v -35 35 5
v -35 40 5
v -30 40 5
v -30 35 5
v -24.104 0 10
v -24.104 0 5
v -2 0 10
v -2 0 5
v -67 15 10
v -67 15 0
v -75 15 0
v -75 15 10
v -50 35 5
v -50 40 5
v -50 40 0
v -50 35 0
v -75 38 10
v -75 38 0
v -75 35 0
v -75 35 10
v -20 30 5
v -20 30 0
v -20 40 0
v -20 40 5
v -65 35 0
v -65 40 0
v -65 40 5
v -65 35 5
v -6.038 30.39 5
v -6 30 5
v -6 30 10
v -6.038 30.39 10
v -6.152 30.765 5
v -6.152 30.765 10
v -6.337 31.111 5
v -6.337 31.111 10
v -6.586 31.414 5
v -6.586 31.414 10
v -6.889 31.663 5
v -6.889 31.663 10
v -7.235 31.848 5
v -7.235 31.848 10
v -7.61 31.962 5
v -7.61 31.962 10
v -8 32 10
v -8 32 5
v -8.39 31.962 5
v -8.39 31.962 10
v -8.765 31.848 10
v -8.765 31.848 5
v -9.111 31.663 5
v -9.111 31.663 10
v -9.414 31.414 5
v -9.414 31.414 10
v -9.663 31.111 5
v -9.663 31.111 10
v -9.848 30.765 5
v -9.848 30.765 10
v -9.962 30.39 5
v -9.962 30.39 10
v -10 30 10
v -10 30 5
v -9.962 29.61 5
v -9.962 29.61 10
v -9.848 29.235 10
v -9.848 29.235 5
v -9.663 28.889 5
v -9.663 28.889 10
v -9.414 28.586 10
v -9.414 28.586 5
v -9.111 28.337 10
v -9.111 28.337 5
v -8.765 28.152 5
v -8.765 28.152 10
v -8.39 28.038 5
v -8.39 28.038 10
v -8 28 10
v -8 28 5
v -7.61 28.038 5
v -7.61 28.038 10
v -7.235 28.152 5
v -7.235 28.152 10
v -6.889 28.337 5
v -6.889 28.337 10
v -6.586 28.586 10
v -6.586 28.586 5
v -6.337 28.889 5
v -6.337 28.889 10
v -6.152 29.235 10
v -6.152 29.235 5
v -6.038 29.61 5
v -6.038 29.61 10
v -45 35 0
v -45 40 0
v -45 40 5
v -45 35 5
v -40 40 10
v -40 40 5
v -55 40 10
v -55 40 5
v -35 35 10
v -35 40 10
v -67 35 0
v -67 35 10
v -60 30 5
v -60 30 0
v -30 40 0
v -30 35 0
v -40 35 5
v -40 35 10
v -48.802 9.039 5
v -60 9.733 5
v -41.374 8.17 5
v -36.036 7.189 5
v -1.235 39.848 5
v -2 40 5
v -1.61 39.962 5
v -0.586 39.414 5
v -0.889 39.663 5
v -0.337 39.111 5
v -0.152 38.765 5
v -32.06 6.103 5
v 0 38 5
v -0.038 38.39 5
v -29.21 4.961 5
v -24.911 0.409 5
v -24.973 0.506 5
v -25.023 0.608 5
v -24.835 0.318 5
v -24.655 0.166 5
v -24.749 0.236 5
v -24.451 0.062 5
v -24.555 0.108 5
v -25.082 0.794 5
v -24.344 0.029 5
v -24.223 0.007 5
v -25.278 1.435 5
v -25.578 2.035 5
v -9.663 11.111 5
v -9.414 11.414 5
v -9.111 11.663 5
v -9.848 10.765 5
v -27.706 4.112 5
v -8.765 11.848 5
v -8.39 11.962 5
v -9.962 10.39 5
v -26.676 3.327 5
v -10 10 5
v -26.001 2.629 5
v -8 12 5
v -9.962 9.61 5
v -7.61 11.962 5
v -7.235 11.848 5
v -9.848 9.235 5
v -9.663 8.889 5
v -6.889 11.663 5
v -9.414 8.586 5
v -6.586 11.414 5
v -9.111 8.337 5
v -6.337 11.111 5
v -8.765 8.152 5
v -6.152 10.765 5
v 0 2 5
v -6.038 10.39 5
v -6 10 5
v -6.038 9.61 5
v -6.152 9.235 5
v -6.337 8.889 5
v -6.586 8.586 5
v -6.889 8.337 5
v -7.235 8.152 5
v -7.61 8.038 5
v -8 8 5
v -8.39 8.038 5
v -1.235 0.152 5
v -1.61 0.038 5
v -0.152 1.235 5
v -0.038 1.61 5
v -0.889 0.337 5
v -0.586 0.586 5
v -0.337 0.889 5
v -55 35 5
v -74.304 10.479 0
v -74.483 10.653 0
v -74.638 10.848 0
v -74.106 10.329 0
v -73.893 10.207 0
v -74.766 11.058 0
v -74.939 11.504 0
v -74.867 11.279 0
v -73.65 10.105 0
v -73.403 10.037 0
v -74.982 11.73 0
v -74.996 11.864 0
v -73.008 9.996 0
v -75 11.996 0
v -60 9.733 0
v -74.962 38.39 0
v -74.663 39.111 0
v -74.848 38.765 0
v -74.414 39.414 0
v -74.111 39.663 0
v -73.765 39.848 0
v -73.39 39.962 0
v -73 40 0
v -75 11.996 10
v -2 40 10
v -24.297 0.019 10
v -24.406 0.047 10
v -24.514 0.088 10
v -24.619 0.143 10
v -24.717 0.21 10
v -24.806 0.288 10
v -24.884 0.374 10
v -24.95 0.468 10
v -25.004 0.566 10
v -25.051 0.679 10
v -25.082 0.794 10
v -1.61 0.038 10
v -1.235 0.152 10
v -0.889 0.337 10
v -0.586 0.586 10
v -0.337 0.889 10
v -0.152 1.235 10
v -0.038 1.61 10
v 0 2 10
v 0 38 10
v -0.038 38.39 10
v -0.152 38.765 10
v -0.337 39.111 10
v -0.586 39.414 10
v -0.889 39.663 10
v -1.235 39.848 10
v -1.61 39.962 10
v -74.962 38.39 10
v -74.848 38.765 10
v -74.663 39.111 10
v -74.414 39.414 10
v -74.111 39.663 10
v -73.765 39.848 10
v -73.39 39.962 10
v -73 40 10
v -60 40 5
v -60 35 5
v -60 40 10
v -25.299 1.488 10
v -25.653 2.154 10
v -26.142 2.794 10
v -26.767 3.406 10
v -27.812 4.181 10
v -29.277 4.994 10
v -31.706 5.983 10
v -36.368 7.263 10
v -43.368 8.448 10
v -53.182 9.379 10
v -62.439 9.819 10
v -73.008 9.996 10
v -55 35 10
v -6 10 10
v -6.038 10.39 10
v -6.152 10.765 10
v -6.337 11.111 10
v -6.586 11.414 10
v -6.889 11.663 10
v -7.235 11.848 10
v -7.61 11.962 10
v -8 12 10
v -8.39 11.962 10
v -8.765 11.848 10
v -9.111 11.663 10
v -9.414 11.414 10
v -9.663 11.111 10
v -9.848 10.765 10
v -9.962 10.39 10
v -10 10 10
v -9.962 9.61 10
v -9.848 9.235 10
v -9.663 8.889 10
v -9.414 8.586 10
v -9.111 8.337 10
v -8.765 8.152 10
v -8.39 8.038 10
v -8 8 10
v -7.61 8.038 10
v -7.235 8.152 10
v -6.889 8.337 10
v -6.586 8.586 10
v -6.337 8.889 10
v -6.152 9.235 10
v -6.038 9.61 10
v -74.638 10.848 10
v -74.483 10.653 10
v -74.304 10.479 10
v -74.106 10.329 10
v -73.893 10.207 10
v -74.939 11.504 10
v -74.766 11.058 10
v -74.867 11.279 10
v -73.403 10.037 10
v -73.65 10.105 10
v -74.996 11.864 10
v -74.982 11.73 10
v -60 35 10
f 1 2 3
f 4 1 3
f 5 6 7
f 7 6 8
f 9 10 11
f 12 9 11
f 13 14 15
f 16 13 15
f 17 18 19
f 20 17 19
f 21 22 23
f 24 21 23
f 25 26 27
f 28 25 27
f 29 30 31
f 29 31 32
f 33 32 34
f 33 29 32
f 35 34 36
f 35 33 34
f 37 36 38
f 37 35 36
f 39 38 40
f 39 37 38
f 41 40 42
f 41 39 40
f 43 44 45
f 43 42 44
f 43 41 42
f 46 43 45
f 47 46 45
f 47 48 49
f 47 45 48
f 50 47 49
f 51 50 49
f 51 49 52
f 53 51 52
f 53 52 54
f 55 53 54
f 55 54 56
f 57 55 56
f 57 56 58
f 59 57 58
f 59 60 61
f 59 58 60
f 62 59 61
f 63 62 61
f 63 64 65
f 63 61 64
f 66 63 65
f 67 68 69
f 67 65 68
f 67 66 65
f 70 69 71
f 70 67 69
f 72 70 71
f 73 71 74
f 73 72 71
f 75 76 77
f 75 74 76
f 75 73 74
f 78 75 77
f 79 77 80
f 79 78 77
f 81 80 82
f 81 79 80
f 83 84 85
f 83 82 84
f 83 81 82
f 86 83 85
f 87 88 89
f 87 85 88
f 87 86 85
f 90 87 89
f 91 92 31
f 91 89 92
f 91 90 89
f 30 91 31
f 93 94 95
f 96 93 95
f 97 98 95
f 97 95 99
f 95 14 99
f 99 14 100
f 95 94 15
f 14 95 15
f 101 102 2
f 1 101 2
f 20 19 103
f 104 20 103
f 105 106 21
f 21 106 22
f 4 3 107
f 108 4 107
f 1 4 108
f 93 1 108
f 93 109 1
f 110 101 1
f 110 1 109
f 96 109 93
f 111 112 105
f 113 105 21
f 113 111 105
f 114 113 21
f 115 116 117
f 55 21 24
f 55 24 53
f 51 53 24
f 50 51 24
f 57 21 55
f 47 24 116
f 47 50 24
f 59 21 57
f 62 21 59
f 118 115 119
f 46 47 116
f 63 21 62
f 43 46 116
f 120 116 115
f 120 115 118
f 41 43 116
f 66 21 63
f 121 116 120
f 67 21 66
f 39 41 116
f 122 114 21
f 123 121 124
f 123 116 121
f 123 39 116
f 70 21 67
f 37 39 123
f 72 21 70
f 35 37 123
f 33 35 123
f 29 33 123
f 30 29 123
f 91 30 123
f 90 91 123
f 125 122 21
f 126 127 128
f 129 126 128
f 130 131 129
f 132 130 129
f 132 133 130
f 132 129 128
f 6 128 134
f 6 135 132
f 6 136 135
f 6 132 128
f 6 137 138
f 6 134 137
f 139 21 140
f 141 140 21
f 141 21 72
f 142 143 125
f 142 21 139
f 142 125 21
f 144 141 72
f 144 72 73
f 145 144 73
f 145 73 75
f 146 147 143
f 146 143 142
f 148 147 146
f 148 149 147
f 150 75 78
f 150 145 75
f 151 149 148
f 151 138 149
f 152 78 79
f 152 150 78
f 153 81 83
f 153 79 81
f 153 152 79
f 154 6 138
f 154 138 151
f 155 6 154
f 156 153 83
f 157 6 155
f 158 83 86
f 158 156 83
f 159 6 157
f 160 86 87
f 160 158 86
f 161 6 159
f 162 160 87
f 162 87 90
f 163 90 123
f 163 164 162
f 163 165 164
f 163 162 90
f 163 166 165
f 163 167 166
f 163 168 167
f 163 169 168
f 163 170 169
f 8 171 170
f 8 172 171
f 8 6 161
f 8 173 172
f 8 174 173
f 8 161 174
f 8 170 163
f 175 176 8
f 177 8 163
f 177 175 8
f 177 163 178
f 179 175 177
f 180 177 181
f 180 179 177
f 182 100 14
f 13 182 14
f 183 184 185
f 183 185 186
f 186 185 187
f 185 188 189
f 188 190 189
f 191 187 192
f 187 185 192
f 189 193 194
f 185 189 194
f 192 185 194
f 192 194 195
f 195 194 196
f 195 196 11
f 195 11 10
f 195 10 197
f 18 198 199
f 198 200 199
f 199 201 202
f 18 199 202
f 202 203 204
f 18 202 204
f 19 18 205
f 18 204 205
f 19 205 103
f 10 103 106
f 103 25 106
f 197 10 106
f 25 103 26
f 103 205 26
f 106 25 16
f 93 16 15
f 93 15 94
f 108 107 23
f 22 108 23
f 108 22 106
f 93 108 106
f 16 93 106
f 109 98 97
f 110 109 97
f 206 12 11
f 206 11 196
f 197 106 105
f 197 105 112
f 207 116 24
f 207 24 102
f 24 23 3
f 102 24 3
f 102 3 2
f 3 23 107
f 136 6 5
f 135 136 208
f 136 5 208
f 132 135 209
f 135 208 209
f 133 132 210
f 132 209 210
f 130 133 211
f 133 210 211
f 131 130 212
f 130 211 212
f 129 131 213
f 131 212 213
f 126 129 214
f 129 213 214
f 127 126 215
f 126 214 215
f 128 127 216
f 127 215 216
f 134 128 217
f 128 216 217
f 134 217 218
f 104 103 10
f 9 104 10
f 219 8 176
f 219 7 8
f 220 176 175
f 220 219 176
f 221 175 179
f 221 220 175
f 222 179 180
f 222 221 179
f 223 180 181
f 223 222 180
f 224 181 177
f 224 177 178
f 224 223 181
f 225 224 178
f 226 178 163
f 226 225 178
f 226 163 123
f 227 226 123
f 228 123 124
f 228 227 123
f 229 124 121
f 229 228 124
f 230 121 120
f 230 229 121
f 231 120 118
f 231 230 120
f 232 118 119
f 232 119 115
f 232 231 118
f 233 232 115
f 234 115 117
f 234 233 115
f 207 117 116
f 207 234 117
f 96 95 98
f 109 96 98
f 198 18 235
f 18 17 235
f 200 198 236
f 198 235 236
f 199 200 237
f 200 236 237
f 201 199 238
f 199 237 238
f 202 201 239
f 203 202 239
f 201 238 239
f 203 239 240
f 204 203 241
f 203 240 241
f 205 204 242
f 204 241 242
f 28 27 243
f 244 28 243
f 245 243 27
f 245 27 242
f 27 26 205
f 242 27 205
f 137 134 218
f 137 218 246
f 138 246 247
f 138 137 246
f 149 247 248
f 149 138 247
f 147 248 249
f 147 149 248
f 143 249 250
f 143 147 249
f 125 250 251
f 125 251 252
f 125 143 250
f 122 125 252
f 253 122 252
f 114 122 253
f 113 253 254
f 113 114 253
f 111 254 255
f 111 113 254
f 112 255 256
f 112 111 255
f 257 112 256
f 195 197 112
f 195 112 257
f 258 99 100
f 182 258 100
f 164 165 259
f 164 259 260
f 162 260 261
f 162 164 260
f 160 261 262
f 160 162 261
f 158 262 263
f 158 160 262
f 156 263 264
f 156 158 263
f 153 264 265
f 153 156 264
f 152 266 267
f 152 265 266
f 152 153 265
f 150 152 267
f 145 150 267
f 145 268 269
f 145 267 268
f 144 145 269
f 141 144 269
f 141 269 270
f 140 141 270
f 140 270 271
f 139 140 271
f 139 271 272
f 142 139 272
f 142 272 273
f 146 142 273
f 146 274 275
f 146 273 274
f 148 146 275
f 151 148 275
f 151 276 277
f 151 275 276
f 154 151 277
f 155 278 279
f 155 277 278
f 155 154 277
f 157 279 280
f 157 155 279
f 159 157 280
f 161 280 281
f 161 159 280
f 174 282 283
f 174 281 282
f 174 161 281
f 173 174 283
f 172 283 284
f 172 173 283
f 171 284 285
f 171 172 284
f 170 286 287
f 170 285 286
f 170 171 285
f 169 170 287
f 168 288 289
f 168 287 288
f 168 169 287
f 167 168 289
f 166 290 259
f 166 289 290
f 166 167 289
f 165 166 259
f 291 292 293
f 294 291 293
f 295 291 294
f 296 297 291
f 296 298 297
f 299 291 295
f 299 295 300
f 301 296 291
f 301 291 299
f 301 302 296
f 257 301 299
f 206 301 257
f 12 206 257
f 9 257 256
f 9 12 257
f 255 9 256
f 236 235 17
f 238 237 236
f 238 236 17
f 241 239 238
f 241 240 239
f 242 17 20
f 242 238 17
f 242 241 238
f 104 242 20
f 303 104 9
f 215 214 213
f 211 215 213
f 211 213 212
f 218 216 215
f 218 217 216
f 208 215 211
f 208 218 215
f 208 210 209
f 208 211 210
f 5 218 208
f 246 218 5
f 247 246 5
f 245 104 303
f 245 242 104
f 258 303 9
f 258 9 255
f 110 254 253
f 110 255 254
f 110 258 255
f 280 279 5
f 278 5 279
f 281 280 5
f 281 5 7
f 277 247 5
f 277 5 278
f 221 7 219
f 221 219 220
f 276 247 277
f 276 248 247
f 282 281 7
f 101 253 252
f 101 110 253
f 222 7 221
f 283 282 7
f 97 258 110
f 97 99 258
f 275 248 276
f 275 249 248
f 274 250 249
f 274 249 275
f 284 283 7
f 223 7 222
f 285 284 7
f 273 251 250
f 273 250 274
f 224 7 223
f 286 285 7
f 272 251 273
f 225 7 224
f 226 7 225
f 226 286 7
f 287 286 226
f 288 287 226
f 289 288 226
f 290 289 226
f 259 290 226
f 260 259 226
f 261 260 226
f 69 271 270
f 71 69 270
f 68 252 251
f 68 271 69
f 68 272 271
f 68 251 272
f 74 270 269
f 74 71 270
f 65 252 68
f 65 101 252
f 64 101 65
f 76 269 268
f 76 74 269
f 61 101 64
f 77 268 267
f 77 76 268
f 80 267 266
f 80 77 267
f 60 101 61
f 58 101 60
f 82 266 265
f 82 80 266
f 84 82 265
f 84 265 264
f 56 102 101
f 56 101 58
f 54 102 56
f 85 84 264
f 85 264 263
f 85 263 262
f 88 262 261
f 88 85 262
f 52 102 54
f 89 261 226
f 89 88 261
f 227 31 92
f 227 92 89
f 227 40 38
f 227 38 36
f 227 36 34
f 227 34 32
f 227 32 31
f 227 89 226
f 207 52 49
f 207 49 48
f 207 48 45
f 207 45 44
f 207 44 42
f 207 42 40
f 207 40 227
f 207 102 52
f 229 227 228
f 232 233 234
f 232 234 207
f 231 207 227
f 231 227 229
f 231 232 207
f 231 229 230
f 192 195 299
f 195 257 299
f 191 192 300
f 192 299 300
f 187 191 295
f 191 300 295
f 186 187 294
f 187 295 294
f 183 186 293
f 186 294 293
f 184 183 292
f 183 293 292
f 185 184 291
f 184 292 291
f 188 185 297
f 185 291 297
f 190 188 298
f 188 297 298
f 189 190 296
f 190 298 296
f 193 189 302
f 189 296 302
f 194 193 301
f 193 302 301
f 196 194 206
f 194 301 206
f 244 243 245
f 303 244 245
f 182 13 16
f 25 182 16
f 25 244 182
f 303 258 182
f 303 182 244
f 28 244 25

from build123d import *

# Parameters (mm, degrees)
PAD_DEPTH       = 10
SKETCH001_W     = 25
SKETCH001_H     = 50
POCKET_DEPTH    = 5
SKETCH002_R     = 2
POCKET001_DEPTH = 12
FILLET_R        = 2
FILLET001_R     = 1
POCKET002_DEPTH = 5
SKETCH004_W     = 40
SKETCH004_H     = 30
POCKET003_DEPTH = 5


with BuildPart() as part:
    # Sketch → Pad (new body)
    with BuildSketch(Plane.XY):
        with BuildLine():
            Line((-25, 0), (0, 0))
            Line((0, 0), (0, 40))
            Line((0, 40), (-75, 40))
            Line((-75, 40), (-75, 35))
            Line((-75, 35), (-67, 35))
            Line((-67, 35), (-67, 15))
            Line((-67, 15), (-75, 15))
            Line((-75, 15), (-75, 10))
            add(Edge.make_bspline(
                [(-25, 0), (-25, 10), (-75, 10)],
                knots=[0, 0, 0, 1, 1, 1], degree=2))
        make_face()
    extrude(amount=PAD_DEPTH)

    # Sketch001 → Pocket (cut)
    with BuildSketch(Plane.XY):
        with Locations((-7.5, 20)):
            Rectangle(SKETCH001_W, SKETCH001_H)
    extrude(amount=POCKET_DEPTH, mode=Mode.SUBTRACT)

    # Sketch002 → Pocket001 (cut)
    with BuildSketch(Plane.XY):
        with Locations((-8, 30)):
            Circle(SKETCH002_R)
        with Locations((-8, 10)):
            Circle(SKETCH002_R)
    extrude(amount=POCKET001_DEPTH, mode=Mode.SUBTRACT)

    # Fillet
    fillet_edges = [part.edges().sort_by_distance(p)[0] for p in [
        (0, 40, 7.5),
        (0, 0, 7.5),
        (-75, 10, 5),
        (-75, 40, 5),
    ]]
    fillet(fillet_edges, radius=FILLET_R)

    # Fillet001
    fillet001_edges = [part.edges().sort_by_distance(p)[0] for p in [
        (-25, 0, 5),
    ]]
    fillet(fillet001_edges, radius=FILLET001_R)

    # Sketch003 (on Face13 of Fillet001) → Pocket002 (cut)
    with BuildSketch(Plane(origin=(0, 40, 0), x_dir=(-1, 0, 0), z_dir=(0, 1, 0))):
        Polygon((65, -5), (65, 5), (60, 5), (60, 15), (55, 15), (55, 5), (50, 5), (50, -5), align=None)
        Polygon((45, -5), (45, 5), (40, 5), (40, 15), (35, 15), (35, 5), (30, 5), (30, -5), align=None)
    extrude(amount=-POCKET002_DEPTH, mode=Mode.SUBTRACT)

    # Sketch004 (on Face5 of Pocket002) → Pocket003 (cut)
    with BuildSketch(Plane(origin=(0, 0, 0), x_dir=(1, 0, 0), z_dir=(0, 0, -1))):
        with Locations((-40, -15)):
            Rectangle(SKETCH004_W, SKETCH004_H)
    extrude(amount=-POCKET003_DEPTH, mode=Mode.SUBTRACT)


solid = part.part
